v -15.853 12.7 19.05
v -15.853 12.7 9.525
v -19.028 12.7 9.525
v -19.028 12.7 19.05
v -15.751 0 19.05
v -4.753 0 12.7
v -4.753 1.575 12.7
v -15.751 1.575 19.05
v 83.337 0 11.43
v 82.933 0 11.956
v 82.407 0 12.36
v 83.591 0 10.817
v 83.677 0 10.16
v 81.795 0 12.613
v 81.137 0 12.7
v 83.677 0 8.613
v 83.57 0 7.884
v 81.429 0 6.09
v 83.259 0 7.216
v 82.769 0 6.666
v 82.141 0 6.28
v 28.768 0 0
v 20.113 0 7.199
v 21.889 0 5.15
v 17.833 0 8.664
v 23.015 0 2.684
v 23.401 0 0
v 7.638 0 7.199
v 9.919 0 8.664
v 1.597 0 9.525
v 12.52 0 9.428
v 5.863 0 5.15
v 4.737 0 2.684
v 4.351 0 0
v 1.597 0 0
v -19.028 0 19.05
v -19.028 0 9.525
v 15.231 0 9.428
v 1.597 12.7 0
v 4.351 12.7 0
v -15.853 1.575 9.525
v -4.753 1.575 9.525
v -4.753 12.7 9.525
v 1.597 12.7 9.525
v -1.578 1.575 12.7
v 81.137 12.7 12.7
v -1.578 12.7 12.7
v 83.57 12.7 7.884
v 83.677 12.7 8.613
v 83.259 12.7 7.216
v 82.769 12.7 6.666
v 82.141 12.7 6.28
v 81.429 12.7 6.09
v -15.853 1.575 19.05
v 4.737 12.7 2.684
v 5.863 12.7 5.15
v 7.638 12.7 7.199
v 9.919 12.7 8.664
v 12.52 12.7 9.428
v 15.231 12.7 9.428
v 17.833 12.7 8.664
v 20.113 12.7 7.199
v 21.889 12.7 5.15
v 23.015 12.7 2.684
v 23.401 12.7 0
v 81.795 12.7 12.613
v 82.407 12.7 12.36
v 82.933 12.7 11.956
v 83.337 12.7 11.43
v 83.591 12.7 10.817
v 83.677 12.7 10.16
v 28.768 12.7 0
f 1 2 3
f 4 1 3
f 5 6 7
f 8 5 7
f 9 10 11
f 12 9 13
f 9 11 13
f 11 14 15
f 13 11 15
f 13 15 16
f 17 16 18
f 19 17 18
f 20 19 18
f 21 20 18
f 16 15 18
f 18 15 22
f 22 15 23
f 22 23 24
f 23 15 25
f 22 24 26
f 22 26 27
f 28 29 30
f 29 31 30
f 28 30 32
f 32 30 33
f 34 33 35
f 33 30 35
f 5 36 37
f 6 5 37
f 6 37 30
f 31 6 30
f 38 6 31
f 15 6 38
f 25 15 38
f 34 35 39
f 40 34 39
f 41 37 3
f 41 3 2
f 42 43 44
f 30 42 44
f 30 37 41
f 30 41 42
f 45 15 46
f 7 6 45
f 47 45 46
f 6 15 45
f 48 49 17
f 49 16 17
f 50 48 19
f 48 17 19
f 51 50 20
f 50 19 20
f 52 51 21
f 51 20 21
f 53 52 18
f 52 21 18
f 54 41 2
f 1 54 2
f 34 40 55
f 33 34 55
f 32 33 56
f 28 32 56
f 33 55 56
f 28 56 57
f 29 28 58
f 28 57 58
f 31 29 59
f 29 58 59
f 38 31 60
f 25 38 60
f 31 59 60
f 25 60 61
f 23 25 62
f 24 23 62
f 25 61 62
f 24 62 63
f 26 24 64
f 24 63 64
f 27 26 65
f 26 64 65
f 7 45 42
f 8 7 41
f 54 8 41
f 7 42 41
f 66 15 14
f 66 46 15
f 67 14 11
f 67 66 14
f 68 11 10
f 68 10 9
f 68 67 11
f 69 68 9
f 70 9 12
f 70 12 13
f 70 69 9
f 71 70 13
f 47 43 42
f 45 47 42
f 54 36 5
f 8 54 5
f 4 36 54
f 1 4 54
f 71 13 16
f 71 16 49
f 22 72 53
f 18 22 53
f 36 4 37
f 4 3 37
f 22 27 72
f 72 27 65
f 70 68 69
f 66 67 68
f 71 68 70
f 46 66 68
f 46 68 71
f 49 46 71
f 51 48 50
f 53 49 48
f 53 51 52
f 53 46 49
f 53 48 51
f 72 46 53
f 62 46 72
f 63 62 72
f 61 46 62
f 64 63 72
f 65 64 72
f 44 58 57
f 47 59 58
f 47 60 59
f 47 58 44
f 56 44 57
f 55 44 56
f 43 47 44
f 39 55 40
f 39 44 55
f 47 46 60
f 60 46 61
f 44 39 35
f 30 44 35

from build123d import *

# Parameters (mm, degrees)
F0_W      = 11.0998
F0_H      = 1.5748
F1_DEPTH  = 12.7
F3_DEPTH  = 9.525
F5_DEPTH  = 6.35
F6_SIZE2  = 10.998513
F6_SIZE   = 6.34999
F7_SIZE   = 3.17499
F8_SIZE   = 2.54
F9_W      = 15.0514596415
F9_H      = 12.7
F10_DEPTH = 25.4
F11_DEPTH = 76.2
F13_DEPTH = 25.4
F15_DEPTH = 25.4
F16_R     = 2.54


# Not quite as in the source:
# - a fillet or chamfer is up to 0.001 mm smaller than in the source, because OpenCascade refuses the exact size


with BuildPart() as f1:
    # F0 (on Top) → F1 (new body)
    with BuildSketch(Plane.XY):
        Polygon((19.0723874551, 12.7), (-4.7528125449, 12.7), (-4.7528125449, 1.5748), (-4.7528125449, 0), (19.0723874551, 0), align=None)
        Polygon((-15.8526125449, 12.7), (-19.0276125449, 12.7), (-19.0276125449, 0), (-15.8526125449, 0), (-15.8526125449, 1.5748), align=None)
        with Locations((-10.3027125449, 0.7874)):
            Rectangle(F0_W, F0_H)
    extrude(amount=F1_DEPTH)

    # F2 (on face) → F3 (cut)
    with BuildSketch(Plane(origin=(0, 0, 0), x_dir=(1, 0, 0), z_dir=(0, 0, -1))):
        Polygon((1.5971874551, -12.7), (1.5971874551, -1.5748), (1.5971874551, 0), (-19.0276125449, 0), (-19.0276125449, -12.7), align=None)
    extrude(amount=-F3_DEPTH, mode=Mode.SUBTRACT)

    # F4 (on face) → F5 (join)
    with BuildSketch(Plane.XY.offset(12.7)):
        Polygon((-15.8526125449, 12.7), (-19.0276125449, 12.7), (-19.0276125449, 0), (-4.7528125449, 0), (-4.7528125449, 1.5748), (-15.8526125449, 1.5748), align=None)
    extrude(amount=F5_DEPTH)

    # F6 (size 6.35 and 10.9985226281 in the source; OpenCascade refuses exactly that, so slightly less here)
    f6_edges = [f1.edges().sort_by_distance(p)[0] for p in [
        (-4.752813, 0.7874, 19.05),
    ]]
    f6_side = f1.faces().sort_by_distance((-4.752813, 0.7874, 15.875))[0]
    chamfer(f6_edges, length=F6_SIZE, length2=F6_SIZE2, reference=f6_side)

    # F7 (size 3.175 in the source; OpenCascade refuses exactly that, so slightly less here)
    f7_edges = [f1.edges().sort_by_distance(p)[0] for p in [
        (-4.752813, 7.1374, 12.7),
    ]]
    chamfer(f7_edges, length=F7_SIZE)

    # F8
    f8_edges = [f1.edges().sort_by_distance(p)[0] for p in [
        (19.072387, 6.35, 12.7),
        (19.072387, 6.35, 0),
        (19.072387, 12.7, 6.35),
    ]]
    chamfer(f8_edges, length=F8_SIZE)

    # F9 (on face) → F10 (cut)
    with BuildSketch(Plane.XY.offset(12.7)):
        with Locations((15.0030172759, 6.35)):
            Rectangle(F9_W, F9_H)
    extrude(amount=-F10_DEPTH, mode=Mode.SUBTRACT)

    # F11 (add): a face of the model
    f11_faces = [f1.faces().sort_by_distance(p)[0] for p in [
        (7.4772874551, 6.35, 6.35),
    ]]
    extrude(f11_faces, amount=F11_DEPTH)

    # F12 (on face) → F13 (cut)
    with BuildSketch(Plane(origin=(0, 12.7, 0), x_dir=(-1, 0, 0), z_dir=(0, 1, 0))):
        with BuildLine():
            Line((-23.4008067042, 0), (-4.3508067042, 0))
            ThreePointArc((-4.3508067042, 0), (-13.8758067042, 9.525), (-23.4008067042, 0))
        make_face()
    extrude(amount=-F13_DEPTH, mode=Mode.SUBTRACT)

    # F14 (on face) → F15 (cut)
    with BuildSketch(Plane(origin=(0, 12.7, 0), x_dir=(-1, 0, 0), z_dir=(0, 1, 0))):
        Polygon((-83.6772874551, 0), (-28.7684481591, 0), (-83.6772874551, 6.35), align=None)
    extrude(amount=-F15_DEPTH, mode=Mode.SUBTRACT)

    # F16
    f16_edges = [f1.edges().sort_by_distance(p)[0] for p in [
        (83.677287, 6.35, 12.7),
        (83.677287, 6.35, 6.35),
    ]]
    fillet(f16_edges, radius=F16_R)


solid = f1.part
